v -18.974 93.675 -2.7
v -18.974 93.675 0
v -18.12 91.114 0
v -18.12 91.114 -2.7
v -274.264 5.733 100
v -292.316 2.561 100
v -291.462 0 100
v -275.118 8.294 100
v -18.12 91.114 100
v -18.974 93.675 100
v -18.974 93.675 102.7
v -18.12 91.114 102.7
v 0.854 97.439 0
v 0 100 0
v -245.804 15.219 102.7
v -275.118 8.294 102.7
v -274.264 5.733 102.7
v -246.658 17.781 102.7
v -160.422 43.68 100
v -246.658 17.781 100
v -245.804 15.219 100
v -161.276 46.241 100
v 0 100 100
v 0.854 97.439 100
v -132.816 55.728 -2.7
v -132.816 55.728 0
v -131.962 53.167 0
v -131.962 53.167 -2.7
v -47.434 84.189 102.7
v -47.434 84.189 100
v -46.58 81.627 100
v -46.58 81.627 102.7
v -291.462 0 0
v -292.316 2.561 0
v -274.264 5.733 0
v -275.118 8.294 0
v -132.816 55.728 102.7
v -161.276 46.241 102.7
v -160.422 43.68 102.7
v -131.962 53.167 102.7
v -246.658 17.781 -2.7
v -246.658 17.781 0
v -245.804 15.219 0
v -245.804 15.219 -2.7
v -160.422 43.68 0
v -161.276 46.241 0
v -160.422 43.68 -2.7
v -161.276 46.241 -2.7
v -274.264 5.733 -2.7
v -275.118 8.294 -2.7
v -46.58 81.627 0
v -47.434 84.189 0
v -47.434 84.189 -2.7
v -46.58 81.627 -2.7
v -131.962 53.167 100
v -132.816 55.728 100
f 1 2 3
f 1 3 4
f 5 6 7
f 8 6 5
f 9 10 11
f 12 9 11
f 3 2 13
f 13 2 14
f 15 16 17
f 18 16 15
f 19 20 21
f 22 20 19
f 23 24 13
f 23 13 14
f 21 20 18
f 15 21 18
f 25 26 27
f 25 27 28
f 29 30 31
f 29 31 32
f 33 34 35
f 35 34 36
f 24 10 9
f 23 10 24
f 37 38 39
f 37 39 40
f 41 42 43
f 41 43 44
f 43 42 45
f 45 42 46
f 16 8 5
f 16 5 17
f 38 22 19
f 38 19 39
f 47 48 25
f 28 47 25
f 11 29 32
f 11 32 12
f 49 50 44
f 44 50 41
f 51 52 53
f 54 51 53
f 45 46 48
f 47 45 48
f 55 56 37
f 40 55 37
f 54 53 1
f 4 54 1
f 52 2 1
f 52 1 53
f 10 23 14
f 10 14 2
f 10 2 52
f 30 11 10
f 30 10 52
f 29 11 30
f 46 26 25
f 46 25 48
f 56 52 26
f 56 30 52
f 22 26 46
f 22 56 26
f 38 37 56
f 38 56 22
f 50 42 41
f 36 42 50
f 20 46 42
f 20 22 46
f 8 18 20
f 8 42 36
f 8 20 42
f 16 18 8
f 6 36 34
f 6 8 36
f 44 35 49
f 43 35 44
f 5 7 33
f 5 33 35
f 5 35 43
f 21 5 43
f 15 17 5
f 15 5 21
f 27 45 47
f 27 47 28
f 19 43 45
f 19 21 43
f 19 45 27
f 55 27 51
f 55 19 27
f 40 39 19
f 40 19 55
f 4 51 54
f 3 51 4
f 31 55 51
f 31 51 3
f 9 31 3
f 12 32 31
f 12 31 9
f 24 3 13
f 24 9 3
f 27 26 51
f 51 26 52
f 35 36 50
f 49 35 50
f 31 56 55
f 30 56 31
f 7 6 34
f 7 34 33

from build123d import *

# Parameters (mm, degrees)
BOSS_EXTRUDE1_DEPTH = 50
SKETCH2_W           = 30
SKETCH2_H           = 2.7
BOSS_EXTRUDE2_DEPTH = 2.7
SKETCH3_W           = 2.743497838
SKETCH3_H           = 100
CUT_EXTRUDE1_DEPTH  = 50
CUT_EXTRUDE2_DEPTH  = 331.140027497


with BuildPart() as part:
    # Sketch1 → Boss-Extrude1 (new body)
    with BuildSketch(Plane.XY):
        Polygon((-300, 0), (-299.146185032, -2.561444905), (0.853814968, 97.438555095), (0, 100), align=None)
    boss_extrude1 = extrude(amount=BOSS_EXTRUDE1_DEPTH)

    # Sketch2 → Boss-Extrude2 (add)
    with BuildSketch(Plane(origin=(-30, 90, 0), x_dir=(0.9486832980505159, 0.3162277660168317, 0), z_dir=(-0.3162277660168318, 0.948683298050516, 0))):
        with Locations((-3.377223398, 1.35)):
            Rectangle(SKETCH2_W, SKETCH2_H)
        with Locations((-123.377223398, 1.35)):
            Rectangle(SKETCH2_W, SKETCH2_H)
        with Locations((-243.377223398, 1.35)):
            Rectangle(SKETCH2_W, SKETCH2_H)
    boss_extrude2 = extrude(amount=-BOSS_EXTRUDE2_DEPTH)

    # Mirror1: Boss-Extrude1 across plane
    add(boss_extrude1.mirror(Plane.XY.offset(50)))

    # Mirror2: Boss-Extrude2 across plane
    add(boss_extrude2.mirror(Plane.XY.offset(50)))

    # Sketch3 → Cut-Extrude1 (cut)
    with BuildSketch(Plane(origin=(-30, 90, 0), x_dir=(0.9486832980505159, 0.3162277660168317, 0), z_dir=(-0.3162277660168318, 0.948683298050516, 0))):
        with Locations((-283.233240496, -50)):
            Rectangle(SKETCH3_W, SKETCH3_H)
    extrude(amount=-CUT_EXTRUDE1_DEPTH, mode=Mode.SUBTRACT)

    # Sketch4 → Cut-Extrude2 (cut, through all)
    with BuildSketch(Plane(origin=(0, 0, 0), x_dir=(-1, 0, 0), z_dir=(0, 0, -1))):
        Polygon((296.543474454, -1.693874712), (297.108099358, 0), (297.397289422, 0.867570193), (292.315665286, 2.561444905), (291.461850318, 0), align=None)
    extrude(amount=-CUT_EXTRUDE2_DEPTH, mode=Mode.SUBTRACT)


solid = part.part
